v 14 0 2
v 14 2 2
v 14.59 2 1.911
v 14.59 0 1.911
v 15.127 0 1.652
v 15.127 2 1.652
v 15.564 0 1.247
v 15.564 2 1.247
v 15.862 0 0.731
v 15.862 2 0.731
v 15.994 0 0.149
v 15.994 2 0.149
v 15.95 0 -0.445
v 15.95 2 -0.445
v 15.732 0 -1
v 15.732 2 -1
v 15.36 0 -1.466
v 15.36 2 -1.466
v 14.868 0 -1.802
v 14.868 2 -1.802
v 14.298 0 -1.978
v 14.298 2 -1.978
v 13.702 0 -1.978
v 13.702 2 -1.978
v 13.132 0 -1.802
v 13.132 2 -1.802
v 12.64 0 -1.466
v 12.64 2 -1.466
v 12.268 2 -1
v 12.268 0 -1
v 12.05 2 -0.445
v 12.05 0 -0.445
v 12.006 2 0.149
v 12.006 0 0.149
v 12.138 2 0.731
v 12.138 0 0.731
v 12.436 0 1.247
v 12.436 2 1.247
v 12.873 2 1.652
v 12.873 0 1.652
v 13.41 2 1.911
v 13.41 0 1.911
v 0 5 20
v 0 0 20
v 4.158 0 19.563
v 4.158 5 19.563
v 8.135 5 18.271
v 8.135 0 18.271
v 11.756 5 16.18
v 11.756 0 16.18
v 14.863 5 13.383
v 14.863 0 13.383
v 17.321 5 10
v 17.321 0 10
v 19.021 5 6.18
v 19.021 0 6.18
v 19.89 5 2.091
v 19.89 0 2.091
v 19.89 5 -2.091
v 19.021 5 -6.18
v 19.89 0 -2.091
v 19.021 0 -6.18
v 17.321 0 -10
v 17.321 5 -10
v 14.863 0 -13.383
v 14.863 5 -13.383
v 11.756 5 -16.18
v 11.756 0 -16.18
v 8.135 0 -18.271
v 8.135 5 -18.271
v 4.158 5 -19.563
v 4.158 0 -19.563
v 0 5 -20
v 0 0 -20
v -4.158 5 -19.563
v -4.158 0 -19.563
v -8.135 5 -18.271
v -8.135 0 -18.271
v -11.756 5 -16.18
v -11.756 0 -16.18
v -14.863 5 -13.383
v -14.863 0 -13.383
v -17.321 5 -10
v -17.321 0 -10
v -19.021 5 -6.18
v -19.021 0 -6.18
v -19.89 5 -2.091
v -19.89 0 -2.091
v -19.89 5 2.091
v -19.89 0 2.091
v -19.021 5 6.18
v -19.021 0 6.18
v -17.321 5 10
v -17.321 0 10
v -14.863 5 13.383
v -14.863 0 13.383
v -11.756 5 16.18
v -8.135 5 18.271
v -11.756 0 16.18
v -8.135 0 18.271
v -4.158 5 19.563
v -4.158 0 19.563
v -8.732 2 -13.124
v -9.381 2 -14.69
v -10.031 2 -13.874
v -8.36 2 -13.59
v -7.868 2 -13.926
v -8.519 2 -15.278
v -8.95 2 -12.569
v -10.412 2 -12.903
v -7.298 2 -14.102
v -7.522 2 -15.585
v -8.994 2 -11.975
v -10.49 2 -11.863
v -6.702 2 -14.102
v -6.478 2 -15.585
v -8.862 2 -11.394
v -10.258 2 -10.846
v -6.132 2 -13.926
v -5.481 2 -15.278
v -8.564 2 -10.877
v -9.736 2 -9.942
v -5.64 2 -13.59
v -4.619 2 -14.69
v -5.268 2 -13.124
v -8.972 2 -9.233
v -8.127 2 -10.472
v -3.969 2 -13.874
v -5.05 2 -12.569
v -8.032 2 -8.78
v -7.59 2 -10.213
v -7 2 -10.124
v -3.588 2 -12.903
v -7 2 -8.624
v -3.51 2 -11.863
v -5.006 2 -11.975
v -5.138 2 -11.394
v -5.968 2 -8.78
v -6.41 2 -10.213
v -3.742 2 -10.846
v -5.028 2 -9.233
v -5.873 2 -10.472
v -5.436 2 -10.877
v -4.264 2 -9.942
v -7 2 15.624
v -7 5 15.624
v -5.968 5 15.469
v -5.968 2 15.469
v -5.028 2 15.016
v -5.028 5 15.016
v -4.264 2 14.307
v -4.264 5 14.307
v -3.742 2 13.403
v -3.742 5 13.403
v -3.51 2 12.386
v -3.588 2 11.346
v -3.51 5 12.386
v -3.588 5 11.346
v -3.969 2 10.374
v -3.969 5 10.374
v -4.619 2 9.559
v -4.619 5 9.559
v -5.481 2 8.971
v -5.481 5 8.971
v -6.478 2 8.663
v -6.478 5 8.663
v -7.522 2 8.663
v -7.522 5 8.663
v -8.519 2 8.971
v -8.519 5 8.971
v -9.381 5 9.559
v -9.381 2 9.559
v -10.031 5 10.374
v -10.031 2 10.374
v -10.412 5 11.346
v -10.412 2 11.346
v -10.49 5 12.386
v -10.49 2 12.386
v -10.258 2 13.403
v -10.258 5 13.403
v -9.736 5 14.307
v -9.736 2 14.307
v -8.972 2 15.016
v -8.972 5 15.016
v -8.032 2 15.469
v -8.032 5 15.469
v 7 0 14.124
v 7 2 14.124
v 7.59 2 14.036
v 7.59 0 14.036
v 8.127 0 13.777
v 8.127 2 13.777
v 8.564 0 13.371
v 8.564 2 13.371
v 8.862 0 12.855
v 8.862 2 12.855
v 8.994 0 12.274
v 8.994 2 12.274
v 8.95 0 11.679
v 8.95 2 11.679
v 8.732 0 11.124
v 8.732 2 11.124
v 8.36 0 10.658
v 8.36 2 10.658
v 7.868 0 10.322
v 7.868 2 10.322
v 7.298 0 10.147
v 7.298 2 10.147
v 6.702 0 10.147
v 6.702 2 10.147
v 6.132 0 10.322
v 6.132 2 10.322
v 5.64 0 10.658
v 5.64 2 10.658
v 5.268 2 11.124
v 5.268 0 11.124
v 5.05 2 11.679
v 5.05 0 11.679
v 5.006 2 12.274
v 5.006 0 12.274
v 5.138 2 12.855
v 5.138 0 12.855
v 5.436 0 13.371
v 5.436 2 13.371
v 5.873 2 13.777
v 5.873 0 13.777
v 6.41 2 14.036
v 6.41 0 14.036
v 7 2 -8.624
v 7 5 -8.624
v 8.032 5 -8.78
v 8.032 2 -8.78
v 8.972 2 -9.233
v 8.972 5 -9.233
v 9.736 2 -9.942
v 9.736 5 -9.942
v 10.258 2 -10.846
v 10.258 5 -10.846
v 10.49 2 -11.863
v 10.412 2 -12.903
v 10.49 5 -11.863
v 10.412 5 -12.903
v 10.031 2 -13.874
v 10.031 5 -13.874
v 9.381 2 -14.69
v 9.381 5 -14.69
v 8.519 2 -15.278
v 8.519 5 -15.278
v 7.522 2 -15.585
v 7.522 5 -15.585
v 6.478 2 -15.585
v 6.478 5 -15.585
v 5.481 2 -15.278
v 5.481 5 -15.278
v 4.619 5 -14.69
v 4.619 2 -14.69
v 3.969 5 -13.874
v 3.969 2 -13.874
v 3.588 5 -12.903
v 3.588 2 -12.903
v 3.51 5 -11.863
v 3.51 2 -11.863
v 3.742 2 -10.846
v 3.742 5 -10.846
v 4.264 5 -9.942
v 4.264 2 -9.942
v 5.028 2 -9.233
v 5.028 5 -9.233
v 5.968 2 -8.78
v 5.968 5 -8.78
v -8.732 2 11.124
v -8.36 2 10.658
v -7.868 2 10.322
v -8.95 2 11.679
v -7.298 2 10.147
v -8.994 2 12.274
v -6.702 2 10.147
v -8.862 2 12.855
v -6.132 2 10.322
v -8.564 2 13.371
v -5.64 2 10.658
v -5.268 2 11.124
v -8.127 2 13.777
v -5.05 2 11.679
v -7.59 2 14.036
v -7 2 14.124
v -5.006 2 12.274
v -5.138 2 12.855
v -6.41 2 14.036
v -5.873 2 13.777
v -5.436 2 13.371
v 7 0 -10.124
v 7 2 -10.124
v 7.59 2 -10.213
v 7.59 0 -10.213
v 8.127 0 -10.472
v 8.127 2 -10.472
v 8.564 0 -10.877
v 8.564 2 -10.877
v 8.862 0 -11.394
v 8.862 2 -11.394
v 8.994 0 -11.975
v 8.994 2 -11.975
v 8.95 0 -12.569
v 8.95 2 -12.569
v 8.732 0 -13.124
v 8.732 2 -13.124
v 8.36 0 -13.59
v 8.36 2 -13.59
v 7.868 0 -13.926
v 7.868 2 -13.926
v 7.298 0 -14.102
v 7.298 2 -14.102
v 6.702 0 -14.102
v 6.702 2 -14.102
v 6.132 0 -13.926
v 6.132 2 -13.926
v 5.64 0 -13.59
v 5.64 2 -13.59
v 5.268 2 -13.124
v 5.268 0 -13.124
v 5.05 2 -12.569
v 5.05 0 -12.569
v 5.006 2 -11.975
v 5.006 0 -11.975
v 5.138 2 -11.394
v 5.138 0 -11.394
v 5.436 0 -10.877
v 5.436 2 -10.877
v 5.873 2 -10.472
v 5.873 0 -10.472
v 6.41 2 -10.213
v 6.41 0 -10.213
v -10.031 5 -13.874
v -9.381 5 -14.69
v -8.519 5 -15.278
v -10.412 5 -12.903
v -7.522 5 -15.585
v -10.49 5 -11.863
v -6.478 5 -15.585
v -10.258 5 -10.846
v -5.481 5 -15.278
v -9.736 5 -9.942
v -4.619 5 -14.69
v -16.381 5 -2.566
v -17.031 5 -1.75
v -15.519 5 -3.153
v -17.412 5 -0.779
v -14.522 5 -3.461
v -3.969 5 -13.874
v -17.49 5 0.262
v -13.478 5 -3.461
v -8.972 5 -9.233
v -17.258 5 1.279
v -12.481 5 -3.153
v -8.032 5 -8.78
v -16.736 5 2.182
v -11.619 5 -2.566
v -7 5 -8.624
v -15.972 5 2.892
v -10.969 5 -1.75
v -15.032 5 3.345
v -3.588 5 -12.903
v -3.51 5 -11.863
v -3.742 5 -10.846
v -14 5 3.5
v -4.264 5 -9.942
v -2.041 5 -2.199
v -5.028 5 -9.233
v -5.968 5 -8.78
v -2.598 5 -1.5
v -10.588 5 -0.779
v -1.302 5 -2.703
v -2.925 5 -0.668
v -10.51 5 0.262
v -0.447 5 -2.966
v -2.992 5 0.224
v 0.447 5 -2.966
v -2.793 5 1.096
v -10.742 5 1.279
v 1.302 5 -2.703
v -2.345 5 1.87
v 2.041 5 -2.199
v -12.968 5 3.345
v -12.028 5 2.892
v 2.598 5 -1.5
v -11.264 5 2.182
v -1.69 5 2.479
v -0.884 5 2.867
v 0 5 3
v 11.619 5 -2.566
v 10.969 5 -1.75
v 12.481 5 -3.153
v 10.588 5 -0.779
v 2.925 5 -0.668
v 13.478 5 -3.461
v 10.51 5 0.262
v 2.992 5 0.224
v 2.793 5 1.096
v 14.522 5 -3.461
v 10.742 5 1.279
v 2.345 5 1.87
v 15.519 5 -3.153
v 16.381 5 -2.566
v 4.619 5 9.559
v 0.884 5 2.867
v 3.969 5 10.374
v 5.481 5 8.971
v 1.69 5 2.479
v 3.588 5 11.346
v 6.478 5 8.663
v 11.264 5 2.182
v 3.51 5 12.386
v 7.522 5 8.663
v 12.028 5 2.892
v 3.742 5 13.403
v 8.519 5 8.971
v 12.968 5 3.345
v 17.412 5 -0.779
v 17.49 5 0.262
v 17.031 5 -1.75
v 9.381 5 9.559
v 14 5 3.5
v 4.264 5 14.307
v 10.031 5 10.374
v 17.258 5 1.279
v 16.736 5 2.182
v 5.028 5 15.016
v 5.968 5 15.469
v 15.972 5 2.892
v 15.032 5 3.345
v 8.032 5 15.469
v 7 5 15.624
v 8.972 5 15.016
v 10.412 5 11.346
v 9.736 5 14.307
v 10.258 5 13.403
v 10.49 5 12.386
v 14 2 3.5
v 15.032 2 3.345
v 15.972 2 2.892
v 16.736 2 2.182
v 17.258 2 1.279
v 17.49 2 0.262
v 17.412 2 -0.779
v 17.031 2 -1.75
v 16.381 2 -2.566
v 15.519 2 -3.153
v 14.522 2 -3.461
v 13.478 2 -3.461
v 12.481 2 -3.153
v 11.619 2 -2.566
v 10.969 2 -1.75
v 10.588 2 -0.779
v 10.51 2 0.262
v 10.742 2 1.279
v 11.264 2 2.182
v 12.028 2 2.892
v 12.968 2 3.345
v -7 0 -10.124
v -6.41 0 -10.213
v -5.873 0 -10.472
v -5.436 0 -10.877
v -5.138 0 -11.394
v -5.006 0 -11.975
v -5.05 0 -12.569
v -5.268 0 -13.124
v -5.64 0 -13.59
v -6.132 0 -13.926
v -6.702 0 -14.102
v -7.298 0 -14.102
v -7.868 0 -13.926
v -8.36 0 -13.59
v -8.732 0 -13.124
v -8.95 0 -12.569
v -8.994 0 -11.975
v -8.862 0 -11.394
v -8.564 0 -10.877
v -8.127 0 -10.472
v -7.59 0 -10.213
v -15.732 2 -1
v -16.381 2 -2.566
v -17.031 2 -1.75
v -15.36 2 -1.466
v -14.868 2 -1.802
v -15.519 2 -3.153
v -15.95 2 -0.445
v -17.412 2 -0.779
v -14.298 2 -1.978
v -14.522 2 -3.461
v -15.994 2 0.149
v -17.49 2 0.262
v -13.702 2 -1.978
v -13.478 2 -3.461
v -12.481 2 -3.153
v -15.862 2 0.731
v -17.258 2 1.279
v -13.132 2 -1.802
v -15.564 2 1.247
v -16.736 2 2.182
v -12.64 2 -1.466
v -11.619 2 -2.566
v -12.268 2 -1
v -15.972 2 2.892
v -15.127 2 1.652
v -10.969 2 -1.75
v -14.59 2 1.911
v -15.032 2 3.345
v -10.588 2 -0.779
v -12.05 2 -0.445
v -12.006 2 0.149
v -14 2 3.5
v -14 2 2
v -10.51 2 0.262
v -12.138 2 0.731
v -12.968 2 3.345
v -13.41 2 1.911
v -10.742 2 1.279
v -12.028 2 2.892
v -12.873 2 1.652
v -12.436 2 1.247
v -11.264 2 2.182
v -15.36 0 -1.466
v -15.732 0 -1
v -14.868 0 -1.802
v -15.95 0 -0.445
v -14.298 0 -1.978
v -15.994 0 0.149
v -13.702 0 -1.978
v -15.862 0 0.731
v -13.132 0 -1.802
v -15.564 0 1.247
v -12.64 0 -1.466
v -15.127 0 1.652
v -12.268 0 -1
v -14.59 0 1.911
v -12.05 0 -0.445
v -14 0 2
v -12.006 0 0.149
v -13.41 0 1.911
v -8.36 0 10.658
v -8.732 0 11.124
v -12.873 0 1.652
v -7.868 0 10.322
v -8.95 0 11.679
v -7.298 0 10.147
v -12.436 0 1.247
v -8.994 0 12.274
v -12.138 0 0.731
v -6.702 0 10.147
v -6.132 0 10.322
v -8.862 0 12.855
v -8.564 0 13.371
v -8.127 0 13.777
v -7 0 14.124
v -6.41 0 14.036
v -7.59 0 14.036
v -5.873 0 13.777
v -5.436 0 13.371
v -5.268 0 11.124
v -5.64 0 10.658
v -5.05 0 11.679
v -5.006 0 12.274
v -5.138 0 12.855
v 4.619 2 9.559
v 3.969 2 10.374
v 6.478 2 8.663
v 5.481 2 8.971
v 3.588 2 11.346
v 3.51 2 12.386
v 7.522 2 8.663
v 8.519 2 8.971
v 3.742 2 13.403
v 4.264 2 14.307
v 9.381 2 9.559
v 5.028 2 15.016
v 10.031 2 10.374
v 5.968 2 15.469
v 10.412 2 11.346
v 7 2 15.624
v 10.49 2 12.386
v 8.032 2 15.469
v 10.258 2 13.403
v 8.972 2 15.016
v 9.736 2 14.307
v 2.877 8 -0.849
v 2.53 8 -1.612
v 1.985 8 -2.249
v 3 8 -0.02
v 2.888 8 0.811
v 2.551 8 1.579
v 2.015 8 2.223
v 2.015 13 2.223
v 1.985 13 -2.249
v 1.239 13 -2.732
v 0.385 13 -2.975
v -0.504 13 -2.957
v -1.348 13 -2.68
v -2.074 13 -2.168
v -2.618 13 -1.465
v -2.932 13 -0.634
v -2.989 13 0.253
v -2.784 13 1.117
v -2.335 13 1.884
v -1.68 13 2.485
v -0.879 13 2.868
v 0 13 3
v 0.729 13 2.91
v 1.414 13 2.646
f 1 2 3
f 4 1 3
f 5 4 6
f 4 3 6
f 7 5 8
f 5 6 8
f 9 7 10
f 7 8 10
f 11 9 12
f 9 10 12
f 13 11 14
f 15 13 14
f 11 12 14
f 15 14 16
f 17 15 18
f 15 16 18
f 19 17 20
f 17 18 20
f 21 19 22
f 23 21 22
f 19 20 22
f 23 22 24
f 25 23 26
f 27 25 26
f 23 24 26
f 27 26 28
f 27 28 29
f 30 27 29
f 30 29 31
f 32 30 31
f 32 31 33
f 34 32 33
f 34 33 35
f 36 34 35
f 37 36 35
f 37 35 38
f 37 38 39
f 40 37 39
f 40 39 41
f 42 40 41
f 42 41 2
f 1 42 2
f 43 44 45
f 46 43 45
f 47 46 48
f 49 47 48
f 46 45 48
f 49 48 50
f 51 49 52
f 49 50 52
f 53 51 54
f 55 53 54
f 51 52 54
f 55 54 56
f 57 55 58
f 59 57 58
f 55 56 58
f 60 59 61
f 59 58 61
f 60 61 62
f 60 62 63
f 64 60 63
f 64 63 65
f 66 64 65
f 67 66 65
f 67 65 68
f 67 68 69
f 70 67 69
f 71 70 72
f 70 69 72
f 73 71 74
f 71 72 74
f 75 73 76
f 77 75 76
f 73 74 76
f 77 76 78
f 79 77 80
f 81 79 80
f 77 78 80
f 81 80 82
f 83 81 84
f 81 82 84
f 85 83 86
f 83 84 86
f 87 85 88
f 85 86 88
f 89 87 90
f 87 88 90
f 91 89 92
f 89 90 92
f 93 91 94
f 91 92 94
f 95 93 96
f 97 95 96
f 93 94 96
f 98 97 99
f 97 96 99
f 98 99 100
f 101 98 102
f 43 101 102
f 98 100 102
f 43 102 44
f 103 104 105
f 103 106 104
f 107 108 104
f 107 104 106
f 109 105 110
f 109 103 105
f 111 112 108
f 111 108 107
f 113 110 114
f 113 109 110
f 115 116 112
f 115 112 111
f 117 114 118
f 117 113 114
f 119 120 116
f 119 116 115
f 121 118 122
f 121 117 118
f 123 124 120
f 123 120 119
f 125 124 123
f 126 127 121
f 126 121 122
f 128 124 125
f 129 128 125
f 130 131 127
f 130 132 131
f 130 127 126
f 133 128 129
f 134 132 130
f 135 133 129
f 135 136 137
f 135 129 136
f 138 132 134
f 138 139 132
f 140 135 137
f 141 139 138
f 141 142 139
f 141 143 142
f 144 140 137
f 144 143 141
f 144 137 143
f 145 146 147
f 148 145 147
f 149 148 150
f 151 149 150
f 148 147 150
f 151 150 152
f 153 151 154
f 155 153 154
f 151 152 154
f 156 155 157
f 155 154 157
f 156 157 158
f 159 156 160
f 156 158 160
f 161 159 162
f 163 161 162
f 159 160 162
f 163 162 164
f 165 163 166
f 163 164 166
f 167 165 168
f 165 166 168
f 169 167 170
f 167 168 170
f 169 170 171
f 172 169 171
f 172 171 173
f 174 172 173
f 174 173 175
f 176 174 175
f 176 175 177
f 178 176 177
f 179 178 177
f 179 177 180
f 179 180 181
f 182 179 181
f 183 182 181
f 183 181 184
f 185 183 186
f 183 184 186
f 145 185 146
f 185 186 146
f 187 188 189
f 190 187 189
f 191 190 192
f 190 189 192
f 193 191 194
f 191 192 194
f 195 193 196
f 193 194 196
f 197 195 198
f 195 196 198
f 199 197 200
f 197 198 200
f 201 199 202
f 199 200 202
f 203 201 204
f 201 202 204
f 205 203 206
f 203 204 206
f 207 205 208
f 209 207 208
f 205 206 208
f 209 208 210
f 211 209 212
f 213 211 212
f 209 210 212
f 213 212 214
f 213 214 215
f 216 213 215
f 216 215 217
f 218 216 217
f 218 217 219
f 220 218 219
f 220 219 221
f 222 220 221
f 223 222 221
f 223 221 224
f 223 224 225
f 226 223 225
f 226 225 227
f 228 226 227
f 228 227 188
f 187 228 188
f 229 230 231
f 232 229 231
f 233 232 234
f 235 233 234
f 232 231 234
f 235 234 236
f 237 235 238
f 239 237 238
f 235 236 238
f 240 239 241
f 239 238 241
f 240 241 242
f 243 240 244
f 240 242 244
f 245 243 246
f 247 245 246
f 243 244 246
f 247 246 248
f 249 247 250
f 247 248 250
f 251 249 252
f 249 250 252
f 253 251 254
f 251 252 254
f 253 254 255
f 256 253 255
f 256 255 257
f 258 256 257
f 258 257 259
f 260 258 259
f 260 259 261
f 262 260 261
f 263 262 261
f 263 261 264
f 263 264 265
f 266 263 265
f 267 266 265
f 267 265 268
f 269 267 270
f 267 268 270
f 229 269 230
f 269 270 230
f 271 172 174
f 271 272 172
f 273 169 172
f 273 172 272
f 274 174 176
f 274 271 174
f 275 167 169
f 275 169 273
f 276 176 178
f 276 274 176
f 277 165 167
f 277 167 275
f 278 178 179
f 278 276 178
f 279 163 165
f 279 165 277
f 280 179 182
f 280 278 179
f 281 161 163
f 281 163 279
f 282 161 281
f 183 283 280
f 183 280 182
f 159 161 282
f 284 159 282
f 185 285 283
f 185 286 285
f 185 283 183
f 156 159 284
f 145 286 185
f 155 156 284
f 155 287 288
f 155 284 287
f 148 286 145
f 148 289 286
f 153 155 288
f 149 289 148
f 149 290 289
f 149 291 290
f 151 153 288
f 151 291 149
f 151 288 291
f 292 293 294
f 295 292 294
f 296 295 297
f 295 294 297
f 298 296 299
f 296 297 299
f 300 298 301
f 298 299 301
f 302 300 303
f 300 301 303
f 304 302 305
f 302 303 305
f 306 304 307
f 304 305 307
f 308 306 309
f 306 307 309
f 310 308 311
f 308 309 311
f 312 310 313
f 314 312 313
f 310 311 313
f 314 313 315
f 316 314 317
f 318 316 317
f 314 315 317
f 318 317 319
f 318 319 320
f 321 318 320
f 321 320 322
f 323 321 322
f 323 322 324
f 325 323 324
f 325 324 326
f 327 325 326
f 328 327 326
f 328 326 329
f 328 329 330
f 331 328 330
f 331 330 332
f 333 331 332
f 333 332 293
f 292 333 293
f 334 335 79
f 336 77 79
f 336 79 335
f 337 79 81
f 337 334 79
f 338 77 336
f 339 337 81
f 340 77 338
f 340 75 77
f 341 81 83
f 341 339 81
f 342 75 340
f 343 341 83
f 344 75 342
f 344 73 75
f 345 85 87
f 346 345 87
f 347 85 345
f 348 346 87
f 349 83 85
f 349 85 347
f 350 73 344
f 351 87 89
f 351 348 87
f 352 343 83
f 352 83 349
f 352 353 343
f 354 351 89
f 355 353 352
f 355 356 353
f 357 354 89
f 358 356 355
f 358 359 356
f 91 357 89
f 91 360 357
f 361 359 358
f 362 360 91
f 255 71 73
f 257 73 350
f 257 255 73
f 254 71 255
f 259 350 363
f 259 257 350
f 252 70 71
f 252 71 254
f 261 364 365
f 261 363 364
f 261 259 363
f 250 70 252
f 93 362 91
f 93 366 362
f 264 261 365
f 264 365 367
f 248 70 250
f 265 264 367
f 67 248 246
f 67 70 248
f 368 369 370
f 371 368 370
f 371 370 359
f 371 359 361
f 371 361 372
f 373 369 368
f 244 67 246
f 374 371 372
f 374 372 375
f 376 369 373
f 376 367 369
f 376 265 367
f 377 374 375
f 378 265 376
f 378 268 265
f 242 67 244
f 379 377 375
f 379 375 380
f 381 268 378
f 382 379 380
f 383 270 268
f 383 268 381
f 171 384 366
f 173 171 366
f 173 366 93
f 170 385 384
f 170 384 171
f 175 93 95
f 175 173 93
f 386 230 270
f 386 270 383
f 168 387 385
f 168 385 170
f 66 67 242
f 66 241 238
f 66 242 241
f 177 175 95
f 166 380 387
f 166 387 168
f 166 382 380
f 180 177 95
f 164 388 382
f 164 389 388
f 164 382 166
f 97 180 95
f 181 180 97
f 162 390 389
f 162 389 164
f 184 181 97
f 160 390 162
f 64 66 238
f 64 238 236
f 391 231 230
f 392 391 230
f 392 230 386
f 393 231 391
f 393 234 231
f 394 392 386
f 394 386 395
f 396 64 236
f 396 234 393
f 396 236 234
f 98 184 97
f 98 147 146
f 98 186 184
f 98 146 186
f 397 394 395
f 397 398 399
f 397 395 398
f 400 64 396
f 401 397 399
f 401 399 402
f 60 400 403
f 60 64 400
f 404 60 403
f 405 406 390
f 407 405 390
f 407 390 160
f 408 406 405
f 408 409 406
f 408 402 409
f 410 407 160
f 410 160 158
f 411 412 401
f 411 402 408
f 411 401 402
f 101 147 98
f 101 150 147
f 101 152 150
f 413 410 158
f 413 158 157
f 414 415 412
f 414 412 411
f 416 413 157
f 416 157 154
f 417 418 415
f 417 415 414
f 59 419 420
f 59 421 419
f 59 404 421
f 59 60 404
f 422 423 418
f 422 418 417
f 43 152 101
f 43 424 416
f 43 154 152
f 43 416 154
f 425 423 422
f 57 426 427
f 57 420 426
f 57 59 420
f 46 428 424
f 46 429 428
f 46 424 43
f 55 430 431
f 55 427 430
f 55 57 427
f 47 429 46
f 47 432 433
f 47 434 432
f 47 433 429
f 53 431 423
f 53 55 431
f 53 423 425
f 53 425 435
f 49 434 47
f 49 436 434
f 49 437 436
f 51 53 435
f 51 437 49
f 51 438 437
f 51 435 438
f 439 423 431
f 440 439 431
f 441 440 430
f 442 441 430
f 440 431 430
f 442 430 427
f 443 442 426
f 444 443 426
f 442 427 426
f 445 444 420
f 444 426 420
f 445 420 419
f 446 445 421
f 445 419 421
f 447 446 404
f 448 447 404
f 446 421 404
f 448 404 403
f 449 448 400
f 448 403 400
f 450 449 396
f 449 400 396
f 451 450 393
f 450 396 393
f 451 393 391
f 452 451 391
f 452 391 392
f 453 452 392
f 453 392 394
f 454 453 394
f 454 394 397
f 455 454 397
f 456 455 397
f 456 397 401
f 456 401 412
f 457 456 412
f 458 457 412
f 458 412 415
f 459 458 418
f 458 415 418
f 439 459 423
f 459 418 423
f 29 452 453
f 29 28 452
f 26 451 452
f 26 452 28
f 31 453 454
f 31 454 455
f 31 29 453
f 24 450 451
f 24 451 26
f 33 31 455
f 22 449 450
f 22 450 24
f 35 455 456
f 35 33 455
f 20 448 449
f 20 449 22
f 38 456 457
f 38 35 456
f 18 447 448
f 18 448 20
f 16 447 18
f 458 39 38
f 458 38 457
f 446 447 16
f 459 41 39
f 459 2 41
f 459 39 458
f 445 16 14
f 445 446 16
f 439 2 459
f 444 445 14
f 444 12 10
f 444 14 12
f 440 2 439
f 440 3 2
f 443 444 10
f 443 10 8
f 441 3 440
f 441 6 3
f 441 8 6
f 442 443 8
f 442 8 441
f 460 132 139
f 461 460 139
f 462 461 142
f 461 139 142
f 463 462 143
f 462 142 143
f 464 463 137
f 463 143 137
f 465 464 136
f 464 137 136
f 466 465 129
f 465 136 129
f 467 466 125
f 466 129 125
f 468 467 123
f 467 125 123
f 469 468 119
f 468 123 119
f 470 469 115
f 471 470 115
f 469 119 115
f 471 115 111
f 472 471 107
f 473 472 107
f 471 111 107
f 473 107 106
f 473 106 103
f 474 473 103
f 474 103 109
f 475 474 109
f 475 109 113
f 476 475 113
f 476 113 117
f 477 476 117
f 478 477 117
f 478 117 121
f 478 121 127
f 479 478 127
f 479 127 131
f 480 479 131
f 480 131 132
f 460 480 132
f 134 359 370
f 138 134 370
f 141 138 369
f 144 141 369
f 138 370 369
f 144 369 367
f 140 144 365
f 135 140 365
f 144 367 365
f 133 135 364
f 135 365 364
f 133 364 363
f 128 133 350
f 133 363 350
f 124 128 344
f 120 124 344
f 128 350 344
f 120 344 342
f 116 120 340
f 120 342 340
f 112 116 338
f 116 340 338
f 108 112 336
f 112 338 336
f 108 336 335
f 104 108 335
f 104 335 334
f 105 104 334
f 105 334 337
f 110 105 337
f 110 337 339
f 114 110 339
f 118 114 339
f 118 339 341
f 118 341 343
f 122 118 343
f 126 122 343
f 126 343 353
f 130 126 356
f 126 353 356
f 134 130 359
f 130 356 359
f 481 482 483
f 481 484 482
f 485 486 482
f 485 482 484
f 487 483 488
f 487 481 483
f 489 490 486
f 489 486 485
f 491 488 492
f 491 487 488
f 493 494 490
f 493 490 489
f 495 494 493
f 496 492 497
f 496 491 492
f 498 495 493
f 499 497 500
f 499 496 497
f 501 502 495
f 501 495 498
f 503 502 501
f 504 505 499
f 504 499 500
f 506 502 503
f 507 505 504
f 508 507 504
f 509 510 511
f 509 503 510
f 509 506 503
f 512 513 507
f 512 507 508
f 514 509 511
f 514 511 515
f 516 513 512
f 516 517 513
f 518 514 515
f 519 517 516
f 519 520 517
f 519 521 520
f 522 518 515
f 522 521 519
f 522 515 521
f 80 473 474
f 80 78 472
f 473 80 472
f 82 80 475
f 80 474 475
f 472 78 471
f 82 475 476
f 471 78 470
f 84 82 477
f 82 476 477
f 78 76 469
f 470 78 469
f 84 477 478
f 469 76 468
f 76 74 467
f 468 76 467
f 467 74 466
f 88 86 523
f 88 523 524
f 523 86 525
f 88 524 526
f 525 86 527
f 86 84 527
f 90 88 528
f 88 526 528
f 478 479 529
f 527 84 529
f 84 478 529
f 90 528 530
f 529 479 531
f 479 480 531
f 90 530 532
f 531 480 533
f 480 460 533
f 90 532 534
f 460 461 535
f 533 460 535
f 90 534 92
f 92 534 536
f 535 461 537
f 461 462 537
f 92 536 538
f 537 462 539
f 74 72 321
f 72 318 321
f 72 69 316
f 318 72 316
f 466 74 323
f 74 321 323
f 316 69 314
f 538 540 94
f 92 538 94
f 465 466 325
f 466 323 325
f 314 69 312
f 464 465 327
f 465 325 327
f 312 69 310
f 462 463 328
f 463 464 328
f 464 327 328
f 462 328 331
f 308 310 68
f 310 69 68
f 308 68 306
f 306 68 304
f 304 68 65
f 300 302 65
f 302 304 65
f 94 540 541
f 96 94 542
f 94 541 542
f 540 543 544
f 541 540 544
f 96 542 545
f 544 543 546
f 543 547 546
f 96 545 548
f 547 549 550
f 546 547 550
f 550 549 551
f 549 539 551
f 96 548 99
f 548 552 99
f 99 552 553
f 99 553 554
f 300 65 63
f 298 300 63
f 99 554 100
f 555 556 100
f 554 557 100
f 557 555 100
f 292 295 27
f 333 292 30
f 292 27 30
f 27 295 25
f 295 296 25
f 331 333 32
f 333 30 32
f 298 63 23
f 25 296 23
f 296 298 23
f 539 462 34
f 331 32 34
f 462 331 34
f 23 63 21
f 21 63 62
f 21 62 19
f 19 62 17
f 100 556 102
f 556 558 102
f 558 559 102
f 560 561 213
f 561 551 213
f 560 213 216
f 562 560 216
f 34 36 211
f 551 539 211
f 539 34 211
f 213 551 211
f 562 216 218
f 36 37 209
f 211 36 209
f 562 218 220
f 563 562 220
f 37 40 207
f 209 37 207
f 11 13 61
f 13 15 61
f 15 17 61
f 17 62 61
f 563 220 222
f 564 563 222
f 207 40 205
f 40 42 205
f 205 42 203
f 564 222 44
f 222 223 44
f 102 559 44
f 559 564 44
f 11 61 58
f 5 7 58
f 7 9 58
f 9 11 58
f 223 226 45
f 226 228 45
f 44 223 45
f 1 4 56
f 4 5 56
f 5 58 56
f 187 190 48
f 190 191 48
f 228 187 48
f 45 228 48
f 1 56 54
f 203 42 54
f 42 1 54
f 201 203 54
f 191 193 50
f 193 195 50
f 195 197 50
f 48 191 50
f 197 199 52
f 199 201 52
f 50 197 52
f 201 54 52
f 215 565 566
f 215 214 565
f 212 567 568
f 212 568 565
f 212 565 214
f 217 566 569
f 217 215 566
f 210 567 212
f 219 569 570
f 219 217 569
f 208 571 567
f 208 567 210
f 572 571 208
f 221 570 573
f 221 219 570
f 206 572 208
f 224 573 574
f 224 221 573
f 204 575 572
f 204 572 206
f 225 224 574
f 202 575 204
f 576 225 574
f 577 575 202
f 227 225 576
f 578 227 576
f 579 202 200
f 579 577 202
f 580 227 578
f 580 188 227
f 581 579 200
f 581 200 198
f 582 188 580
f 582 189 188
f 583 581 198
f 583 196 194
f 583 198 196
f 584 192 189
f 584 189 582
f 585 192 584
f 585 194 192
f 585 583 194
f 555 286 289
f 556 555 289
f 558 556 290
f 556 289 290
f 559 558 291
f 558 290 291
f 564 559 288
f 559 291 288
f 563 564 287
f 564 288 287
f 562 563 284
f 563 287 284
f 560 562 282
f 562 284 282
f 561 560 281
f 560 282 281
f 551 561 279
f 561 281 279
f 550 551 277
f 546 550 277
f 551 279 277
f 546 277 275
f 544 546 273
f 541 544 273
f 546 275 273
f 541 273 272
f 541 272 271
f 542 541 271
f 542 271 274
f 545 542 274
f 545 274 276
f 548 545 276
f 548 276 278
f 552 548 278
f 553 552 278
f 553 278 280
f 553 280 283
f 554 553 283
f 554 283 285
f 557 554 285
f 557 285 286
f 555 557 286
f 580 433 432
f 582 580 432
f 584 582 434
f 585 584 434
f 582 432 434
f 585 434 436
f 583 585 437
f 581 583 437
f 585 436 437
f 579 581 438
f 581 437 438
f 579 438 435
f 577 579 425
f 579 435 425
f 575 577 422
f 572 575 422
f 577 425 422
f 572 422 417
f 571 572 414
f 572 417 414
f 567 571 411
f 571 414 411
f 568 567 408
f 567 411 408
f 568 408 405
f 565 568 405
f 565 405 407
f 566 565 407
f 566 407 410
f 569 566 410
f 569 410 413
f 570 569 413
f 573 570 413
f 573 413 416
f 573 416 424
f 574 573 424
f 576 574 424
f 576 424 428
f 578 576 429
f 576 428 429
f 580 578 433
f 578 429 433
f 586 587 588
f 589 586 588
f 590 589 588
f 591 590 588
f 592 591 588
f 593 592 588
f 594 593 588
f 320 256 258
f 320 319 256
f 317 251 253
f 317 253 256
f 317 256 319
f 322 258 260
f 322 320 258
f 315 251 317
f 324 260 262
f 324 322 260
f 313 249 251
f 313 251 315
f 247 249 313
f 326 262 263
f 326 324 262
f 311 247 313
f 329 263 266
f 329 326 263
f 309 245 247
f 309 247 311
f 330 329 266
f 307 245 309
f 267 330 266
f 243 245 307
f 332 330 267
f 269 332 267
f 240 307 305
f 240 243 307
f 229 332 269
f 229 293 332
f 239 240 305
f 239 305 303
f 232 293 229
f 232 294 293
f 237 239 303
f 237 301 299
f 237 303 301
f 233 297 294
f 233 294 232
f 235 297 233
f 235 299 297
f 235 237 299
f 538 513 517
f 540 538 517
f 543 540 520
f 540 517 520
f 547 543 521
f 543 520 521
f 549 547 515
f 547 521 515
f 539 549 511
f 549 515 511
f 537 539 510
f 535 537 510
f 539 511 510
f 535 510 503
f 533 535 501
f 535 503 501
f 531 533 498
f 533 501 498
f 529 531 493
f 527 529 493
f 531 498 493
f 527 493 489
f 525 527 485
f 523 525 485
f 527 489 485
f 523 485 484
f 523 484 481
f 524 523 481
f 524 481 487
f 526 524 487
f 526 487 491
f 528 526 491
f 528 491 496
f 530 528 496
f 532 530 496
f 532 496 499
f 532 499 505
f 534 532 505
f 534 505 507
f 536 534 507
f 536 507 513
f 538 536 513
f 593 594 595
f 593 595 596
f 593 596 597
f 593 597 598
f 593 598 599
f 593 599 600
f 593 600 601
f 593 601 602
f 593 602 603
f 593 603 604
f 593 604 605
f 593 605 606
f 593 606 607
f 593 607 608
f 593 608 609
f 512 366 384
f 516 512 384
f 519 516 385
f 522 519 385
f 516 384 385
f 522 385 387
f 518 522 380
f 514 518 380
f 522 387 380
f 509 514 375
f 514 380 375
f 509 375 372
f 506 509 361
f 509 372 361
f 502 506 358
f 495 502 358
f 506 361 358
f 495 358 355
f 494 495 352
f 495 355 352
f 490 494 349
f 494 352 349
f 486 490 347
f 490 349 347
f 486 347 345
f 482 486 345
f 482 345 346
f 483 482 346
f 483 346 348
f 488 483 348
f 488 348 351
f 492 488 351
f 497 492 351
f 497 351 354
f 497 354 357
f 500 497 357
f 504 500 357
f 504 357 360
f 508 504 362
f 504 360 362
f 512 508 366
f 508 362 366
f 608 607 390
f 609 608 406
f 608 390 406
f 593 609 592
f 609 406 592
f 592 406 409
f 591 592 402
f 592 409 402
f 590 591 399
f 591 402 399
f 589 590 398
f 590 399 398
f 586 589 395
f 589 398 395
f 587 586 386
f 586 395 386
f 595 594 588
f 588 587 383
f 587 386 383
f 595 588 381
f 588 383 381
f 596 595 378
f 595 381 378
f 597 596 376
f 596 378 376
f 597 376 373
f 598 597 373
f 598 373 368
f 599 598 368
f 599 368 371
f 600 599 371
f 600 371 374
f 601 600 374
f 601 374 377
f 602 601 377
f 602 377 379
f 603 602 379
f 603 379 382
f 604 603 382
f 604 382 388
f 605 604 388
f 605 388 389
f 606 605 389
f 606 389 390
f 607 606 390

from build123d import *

# Parameters (mm, degrees)
SKETCH_1_R          = 20
EXTRUDE_1_DEPTH     = 5
SKETCH_2_R          = 2
CUT_EXTRUDE_1_DEPTH = 29.722813233
SKETCH_3_R          = 3.5
CUT_EXTRUDE_2_DEPTH = 3
SKETCH_4_R          = 3
EXTRUDE_2_DEPTH     = 8
CUT_EXTRUDE_START   = -5
CUT_EXTRUDE_3_DEPTH = 5


with BuildPart() as part:
    # 草图1 → 凸台-拉伸1 (new body)
    with BuildSketch(Plane(origin=(0, 0, 0), x_dir=(1, 0, 0), z_dir=(0, 1, 0))):
        with Locations(Location((0, 0, 0), (0, 0, 270))):
            Circle(SKETCH_1_R)
    extrude(amount=EXTRUDE_1_DEPTH)

    # 草图2 → 切除-拉伸1 (cut, through all)
    with BuildSketch(Plane(origin=(0, 5, 0), x_dir=(1, 0, 0), z_dir=(0, 1, 0))):
        with Locations(Location((14, 0, 0), (0, 0, 270))):
            Circle(SKETCH_2_R)
        with Locations(Location((7, -12.124355653, 0), (0, 0, 270))):
            Circle(SKETCH_2_R)
        with Locations(Location((-7, -12.124355653, 0), (0, 0, 270))):
            Circle(SKETCH_2_R)
        with Locations(Location((-14, 0, 0), (0, 0, 270))):
            Circle(SKETCH_2_R)
        with Locations(Location((-7, 12.124355653, 0), (0, 0, 270))):
            Circle(SKETCH_2_R)
        with Locations(Location((7, 12.124355653, 0), (0, 0, 270))):
            Circle(SKETCH_2_R)
    extrude(amount=-CUT_EXTRUDE_1_DEPTH, mode=Mode.SUBTRACT)

    # 草图3 → 切除-拉伸2 (cut)
    with BuildSketch(Plane(origin=(0, 5, 0), x_dir=(1, 0, 0), z_dir=(0, 1, 0))):
        with Locations(Location((14, 0, 0), (0, 0, 270))):
            Circle(SKETCH_3_R)
        with Locations(Location((7, -12.124355653, 0), (0, 0, 270))):
            Circle(SKETCH_3_R)
        with Locations(Location((-7, -12.124355653, 0), (0, 0, 270))):
            Circle(SKETCH_3_R)
        with Locations(Location((-14, 0, 0), (0, 0, 270))):
            Circle(SKETCH_3_R)
        with Locations(Location((-7, 12.124355653, 0), (0, 0, 270))):
            Circle(SKETCH_3_R)
        with Locations(Location((7, 12.124355653, 0), (0, 0, 270))):
            Circle(SKETCH_3_R)
    extrude(amount=-CUT_EXTRUDE_2_DEPTH, mode=Mode.SUBTRACT)

    # 草图4 → 凸台-拉伸2 (add)
    with BuildSketch(Plane(origin=(0, 5, 0), x_dir=(1, 0, 0), z_dir=(0, 1, 0))):
        with Locations(Location((0, 0, 0), (0, 0, 270))):
            Circle(SKETCH_4_R)
    extrude(amount=EXTRUDE_2_DEPTH)

    # 草图5 → 切除-拉伸3 (cut)
    with BuildSketch(Plane(origin=(0, 13, 0), x_dir=(1, 0, 0), z_dir=(0, 1, 0)).offset(CUT_EXTRUDE_START)):
        with BuildLine():
            Line((2.014530219, -2.222986279), (1.985384834, 2.249054704))
            ThreePointArc((1.985384834, 2.249054704), (2.99993629, 0.019551319), (2.014530219, -2.222986279))
        make_face()
    extrude(amount=CUT_EXTRUDE_3_DEPTH, mode=Mode.SUBTRACT)


solid = part.part
